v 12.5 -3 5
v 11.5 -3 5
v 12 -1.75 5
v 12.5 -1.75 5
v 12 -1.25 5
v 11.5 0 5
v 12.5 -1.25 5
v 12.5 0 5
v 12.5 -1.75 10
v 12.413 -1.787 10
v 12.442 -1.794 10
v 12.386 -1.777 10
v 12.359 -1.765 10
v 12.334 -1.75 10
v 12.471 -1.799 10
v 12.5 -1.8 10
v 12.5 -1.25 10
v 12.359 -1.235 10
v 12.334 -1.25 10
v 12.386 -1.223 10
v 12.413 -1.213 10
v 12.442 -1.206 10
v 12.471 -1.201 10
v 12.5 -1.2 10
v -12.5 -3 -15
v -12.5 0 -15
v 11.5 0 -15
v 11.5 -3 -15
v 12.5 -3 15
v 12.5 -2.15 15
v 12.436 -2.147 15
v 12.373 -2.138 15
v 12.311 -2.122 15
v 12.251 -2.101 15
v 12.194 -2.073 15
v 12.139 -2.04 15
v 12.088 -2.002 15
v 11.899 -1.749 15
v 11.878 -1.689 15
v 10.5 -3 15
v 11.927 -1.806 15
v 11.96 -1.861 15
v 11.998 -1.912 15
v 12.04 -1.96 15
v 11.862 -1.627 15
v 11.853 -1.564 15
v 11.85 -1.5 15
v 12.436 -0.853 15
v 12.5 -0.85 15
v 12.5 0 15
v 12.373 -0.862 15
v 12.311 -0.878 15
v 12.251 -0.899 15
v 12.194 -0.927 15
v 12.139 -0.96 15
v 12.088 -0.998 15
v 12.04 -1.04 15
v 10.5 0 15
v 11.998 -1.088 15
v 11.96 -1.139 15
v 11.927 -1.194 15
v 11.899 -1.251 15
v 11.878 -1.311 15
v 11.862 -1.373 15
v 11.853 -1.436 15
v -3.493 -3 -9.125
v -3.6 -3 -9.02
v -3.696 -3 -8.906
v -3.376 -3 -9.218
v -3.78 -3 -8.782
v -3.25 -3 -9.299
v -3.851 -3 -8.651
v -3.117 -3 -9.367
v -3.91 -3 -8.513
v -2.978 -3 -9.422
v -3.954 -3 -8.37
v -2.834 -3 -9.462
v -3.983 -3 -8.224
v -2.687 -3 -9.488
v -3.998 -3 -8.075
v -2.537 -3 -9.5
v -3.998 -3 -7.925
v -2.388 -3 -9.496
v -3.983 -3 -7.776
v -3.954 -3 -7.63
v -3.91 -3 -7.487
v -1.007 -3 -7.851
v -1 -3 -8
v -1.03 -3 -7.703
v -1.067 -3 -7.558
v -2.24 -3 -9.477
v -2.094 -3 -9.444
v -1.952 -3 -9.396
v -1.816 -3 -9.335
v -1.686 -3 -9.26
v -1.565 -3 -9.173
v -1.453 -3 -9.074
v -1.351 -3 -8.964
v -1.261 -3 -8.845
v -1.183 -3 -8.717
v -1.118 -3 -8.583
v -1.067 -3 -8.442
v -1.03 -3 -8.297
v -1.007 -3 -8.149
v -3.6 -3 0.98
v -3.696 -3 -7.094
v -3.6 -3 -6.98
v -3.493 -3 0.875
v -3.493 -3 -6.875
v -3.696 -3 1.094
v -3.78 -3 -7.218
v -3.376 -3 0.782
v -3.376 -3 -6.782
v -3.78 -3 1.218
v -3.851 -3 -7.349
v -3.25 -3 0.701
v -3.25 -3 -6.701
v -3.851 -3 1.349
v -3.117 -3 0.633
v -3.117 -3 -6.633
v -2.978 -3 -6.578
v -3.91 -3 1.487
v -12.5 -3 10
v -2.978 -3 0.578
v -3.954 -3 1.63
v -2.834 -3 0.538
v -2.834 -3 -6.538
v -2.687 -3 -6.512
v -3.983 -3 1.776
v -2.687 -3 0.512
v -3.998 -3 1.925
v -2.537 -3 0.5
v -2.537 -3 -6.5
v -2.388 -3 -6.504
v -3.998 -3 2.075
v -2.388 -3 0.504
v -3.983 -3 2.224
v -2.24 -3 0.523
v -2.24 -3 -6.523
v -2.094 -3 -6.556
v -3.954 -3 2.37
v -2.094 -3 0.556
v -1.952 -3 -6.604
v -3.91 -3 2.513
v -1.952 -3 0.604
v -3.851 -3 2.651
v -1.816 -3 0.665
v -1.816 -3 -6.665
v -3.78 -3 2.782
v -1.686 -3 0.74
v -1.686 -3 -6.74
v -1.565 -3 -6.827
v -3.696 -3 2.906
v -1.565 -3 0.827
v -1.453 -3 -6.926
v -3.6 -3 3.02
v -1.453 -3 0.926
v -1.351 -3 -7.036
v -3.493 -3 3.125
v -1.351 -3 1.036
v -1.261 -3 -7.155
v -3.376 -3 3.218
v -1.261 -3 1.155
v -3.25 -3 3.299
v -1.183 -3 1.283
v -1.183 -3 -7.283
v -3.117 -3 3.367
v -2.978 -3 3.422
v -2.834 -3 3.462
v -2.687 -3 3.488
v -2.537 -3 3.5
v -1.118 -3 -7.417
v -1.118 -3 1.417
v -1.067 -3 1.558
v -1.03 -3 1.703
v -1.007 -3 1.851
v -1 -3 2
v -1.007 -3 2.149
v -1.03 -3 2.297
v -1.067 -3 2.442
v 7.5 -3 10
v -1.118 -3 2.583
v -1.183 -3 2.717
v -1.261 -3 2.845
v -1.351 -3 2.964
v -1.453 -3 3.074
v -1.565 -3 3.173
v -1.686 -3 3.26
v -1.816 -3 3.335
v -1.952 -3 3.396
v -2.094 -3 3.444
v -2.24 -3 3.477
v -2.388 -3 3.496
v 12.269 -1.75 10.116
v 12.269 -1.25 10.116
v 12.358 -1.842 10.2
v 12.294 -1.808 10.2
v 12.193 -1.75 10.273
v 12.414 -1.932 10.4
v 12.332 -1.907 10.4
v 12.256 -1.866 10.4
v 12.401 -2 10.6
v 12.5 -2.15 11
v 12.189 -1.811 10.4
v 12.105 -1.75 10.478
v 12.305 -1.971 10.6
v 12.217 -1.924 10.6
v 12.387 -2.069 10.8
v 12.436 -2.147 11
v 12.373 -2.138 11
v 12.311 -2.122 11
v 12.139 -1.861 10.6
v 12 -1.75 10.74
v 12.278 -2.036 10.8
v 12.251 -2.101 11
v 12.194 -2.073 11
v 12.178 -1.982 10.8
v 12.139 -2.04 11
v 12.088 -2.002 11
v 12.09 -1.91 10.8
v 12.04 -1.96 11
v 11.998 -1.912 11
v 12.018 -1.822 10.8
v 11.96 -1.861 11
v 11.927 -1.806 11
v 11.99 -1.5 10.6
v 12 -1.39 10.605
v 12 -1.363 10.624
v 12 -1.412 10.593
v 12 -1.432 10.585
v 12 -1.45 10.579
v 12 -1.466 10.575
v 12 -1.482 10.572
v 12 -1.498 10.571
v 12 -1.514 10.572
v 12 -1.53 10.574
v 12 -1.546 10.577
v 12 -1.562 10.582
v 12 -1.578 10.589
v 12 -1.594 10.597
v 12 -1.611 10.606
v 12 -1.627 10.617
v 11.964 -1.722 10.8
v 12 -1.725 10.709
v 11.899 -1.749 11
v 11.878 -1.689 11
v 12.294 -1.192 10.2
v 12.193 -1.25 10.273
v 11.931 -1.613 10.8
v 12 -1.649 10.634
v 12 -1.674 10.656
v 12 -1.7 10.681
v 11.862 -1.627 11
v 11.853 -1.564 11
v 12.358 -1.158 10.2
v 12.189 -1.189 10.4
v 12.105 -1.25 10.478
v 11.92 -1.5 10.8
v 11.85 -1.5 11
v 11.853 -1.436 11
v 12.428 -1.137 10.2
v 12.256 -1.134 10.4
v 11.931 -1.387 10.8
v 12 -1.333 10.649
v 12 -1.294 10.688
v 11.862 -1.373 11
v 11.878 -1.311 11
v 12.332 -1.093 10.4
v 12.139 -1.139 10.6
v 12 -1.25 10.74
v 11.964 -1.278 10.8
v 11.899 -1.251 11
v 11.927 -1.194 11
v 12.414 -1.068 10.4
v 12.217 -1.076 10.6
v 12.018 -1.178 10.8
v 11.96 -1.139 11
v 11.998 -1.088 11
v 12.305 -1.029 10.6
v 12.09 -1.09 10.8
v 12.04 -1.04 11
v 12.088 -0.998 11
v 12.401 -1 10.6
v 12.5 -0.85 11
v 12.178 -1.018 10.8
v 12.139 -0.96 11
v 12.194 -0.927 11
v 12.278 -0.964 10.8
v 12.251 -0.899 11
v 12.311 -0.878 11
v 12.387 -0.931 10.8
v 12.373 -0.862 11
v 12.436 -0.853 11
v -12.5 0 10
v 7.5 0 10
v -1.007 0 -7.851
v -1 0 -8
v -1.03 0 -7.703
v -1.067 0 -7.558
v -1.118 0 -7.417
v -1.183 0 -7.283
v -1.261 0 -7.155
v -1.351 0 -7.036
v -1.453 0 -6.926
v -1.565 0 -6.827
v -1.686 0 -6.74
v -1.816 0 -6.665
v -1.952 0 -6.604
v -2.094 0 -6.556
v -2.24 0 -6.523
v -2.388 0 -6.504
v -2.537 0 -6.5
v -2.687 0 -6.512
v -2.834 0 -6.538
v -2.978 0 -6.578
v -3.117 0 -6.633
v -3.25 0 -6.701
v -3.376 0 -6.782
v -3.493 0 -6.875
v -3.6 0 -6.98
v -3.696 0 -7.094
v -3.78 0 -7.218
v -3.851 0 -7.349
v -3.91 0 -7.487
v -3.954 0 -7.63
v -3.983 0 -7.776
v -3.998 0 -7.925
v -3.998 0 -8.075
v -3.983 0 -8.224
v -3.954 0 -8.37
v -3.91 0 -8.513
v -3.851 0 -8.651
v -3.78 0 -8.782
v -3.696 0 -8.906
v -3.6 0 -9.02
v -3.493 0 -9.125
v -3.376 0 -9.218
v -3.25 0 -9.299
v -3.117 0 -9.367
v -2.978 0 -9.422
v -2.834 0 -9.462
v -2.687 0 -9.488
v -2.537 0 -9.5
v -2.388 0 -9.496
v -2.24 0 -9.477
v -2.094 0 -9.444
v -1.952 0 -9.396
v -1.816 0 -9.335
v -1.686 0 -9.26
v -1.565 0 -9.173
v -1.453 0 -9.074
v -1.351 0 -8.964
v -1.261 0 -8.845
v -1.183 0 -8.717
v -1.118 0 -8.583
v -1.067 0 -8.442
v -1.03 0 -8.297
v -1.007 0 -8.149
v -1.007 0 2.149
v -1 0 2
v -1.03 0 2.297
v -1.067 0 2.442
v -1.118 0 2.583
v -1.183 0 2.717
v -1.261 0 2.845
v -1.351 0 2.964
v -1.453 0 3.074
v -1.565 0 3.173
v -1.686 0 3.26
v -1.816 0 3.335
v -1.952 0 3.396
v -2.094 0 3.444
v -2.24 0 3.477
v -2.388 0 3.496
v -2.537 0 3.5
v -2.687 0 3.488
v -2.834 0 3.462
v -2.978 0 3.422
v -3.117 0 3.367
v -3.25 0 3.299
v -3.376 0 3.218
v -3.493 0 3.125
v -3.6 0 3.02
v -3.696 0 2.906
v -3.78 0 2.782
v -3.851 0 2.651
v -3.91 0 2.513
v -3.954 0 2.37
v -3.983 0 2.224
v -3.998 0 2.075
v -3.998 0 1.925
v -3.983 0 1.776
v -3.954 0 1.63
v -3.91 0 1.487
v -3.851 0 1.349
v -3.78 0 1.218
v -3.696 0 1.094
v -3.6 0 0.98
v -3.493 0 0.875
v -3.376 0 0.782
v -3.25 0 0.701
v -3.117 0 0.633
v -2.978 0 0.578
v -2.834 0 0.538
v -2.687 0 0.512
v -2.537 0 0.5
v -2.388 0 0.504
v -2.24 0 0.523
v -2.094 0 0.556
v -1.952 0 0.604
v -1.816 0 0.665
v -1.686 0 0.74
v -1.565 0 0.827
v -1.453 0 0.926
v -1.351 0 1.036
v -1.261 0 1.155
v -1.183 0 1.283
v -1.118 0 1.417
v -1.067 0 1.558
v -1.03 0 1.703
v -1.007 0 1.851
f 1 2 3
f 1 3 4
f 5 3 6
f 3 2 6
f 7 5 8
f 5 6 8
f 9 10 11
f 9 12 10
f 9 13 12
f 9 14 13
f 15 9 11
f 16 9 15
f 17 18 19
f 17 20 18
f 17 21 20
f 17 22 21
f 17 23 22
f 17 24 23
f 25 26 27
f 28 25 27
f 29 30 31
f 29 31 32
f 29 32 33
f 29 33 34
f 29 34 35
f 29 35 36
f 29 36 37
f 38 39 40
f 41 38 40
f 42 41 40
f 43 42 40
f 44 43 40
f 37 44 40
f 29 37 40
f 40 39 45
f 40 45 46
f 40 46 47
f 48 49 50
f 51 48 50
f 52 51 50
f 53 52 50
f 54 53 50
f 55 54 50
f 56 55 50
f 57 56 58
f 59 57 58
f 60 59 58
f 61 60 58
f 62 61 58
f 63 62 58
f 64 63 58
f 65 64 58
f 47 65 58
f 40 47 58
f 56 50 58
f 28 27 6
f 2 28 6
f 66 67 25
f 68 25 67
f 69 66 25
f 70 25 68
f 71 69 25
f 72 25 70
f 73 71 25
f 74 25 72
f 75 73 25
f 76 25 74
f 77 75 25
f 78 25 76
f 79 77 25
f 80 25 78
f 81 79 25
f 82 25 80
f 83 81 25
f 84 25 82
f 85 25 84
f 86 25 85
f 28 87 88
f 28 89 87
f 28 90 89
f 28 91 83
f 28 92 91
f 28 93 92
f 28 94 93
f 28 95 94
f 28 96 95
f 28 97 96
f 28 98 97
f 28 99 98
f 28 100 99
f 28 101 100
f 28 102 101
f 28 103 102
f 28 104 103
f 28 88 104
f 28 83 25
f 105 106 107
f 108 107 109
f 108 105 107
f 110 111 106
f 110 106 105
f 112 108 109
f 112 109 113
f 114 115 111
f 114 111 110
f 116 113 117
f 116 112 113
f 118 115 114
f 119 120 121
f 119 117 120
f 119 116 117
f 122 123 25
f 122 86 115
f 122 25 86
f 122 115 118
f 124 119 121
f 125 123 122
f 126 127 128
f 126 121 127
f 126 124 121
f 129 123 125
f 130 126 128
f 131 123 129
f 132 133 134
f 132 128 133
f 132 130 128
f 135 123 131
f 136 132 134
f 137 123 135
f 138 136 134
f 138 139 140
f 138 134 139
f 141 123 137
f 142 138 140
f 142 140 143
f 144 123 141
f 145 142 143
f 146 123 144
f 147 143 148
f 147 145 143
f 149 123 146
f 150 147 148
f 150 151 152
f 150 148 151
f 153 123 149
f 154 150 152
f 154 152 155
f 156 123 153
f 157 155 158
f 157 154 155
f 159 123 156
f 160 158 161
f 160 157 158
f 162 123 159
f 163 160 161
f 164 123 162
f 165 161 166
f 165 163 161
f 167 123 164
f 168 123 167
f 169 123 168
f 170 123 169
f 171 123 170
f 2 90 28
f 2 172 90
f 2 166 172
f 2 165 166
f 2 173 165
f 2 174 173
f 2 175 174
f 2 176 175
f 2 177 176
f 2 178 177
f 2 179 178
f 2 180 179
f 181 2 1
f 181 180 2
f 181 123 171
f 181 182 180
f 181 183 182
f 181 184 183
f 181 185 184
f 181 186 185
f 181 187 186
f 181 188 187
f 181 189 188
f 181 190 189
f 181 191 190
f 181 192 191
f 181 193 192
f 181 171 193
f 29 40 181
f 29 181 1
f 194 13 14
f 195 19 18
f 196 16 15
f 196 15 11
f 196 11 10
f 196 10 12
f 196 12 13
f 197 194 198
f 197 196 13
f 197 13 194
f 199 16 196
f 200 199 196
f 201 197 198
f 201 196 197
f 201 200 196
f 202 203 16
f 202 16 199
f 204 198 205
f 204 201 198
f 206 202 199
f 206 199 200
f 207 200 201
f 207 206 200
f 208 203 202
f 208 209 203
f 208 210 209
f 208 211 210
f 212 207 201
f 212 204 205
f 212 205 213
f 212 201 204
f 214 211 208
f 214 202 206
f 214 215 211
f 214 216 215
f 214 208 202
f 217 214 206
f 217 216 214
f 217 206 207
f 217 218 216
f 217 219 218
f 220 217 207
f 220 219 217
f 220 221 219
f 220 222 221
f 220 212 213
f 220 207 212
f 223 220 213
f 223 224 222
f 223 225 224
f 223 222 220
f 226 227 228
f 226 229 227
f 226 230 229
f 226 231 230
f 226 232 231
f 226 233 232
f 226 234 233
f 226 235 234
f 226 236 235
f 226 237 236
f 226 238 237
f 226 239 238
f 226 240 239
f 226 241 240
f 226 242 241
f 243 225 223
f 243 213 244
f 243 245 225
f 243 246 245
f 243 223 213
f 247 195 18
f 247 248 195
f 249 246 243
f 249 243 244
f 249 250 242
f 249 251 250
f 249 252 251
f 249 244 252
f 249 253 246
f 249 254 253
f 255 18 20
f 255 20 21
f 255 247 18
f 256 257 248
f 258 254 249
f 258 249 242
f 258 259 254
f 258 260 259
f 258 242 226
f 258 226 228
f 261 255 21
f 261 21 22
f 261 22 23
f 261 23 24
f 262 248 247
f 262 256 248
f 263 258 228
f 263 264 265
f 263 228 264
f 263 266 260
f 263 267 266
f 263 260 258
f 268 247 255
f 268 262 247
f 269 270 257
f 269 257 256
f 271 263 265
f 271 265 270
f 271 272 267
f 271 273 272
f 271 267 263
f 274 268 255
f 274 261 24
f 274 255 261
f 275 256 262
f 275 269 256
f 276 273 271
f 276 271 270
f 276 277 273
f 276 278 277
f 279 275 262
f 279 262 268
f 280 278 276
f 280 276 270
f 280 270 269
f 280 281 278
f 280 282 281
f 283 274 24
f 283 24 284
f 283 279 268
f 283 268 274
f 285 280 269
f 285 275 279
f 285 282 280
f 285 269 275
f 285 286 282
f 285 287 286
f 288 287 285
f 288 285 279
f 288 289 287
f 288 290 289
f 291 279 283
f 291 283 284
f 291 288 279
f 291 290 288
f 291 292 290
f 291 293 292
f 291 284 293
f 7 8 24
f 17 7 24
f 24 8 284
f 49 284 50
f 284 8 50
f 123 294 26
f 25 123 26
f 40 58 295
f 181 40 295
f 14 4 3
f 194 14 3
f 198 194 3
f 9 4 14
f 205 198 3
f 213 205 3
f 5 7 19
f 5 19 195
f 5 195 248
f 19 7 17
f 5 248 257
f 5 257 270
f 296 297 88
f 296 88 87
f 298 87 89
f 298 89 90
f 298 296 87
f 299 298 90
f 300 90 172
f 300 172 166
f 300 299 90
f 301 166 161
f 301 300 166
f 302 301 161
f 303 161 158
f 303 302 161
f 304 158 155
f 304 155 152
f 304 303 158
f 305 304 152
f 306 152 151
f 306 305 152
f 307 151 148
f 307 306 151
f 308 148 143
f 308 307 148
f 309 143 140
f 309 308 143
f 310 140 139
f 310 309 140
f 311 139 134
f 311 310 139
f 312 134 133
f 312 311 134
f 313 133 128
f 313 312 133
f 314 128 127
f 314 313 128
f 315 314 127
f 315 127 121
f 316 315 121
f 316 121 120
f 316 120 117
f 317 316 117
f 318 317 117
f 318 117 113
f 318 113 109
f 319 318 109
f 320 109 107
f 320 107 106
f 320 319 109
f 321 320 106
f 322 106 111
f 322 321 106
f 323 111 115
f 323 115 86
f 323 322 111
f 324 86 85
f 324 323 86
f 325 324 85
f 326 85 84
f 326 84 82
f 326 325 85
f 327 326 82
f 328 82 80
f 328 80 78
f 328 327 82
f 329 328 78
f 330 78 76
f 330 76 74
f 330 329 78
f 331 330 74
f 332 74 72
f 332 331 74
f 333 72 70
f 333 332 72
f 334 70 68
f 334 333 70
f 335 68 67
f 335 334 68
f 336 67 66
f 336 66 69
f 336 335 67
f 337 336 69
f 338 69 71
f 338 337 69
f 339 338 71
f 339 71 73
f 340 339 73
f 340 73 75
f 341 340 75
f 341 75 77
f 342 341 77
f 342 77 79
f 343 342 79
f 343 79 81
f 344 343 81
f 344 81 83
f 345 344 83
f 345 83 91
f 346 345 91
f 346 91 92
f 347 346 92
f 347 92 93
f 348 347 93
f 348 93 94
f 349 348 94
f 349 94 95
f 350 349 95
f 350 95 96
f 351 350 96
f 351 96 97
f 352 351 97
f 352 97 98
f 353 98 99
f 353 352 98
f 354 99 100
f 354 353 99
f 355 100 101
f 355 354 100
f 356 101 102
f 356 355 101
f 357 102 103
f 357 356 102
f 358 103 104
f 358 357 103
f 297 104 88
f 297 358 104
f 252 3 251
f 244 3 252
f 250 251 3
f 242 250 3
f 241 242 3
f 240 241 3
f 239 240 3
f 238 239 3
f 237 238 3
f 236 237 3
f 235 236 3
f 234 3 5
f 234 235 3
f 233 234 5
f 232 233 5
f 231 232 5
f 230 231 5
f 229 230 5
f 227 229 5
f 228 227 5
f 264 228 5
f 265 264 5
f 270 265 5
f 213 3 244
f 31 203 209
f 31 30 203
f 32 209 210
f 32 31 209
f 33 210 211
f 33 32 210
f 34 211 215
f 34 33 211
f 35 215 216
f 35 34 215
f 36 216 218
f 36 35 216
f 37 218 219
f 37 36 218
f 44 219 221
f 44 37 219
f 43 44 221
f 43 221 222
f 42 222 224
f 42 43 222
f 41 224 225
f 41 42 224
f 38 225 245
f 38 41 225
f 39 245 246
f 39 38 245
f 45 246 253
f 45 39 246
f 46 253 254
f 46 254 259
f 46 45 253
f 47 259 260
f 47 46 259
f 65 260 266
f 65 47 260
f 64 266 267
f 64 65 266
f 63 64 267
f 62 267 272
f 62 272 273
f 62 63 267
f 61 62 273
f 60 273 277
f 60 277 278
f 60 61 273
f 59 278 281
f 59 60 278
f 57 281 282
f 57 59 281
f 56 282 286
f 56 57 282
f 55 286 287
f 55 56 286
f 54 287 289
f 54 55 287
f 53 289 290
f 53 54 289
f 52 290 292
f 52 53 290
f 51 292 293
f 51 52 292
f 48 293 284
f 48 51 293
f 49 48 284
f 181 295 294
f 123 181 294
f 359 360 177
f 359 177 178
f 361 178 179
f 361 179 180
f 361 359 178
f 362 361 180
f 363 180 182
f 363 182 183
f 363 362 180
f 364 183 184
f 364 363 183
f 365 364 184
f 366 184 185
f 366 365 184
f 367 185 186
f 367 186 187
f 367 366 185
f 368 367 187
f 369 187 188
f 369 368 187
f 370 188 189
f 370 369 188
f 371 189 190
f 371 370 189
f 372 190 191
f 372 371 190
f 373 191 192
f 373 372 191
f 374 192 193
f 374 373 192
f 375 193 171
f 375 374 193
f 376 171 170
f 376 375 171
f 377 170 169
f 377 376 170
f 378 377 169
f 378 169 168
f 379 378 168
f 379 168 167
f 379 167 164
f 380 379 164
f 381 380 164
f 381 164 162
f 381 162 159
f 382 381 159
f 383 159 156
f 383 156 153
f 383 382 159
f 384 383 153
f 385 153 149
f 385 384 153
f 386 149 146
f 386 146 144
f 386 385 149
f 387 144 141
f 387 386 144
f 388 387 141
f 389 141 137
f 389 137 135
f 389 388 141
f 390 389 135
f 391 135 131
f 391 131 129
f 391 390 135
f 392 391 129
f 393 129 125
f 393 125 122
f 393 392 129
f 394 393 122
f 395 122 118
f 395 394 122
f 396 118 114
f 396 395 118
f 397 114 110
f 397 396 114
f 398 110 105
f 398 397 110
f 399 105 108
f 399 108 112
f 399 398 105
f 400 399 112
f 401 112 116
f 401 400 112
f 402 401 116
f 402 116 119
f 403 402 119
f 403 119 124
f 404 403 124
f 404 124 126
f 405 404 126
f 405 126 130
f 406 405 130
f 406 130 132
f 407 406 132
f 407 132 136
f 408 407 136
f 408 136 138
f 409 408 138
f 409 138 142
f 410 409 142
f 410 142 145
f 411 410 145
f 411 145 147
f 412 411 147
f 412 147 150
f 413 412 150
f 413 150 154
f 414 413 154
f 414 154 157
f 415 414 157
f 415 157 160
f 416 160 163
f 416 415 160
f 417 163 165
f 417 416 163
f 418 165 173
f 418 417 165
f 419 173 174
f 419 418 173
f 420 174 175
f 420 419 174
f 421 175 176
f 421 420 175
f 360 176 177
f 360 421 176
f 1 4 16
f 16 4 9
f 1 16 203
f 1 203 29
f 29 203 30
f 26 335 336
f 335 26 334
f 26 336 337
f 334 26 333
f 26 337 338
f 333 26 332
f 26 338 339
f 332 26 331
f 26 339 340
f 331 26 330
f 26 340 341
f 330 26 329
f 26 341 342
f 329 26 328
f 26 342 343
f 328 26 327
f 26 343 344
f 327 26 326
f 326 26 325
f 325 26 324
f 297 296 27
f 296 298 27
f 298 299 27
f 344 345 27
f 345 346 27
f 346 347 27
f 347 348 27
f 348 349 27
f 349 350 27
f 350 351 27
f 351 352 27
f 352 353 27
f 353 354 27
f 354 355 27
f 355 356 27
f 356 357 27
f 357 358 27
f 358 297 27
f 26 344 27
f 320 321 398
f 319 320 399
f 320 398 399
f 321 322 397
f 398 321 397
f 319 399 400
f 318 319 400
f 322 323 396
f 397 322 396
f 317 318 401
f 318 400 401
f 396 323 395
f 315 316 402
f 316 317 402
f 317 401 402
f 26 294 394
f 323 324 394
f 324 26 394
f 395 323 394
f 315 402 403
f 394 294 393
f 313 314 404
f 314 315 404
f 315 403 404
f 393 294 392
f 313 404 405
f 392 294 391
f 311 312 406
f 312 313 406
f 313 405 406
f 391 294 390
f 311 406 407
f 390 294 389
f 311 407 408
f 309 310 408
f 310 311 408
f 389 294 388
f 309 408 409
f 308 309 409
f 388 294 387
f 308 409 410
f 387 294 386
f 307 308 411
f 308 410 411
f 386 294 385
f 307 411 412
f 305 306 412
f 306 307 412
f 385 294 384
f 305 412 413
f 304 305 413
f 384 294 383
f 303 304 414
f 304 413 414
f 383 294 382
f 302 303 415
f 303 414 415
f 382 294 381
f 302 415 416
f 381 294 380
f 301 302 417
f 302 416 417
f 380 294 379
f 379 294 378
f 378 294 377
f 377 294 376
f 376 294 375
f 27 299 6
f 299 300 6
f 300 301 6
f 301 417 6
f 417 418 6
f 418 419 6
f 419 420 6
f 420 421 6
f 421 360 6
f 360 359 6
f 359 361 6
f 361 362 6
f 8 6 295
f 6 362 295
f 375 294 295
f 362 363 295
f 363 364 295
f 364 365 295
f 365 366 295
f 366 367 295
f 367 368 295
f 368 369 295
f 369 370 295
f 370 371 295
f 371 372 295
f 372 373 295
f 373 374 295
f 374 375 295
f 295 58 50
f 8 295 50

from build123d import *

# Parameters (mm, degrees)
F0_R     = 1.5
F1_DEPTH = 3
F4_W     = 0.5
F4_H     = 7.027182
F5_DEPTH = 0.5


with BuildPart() as f1:
    # F0 (on Front) → F1 (new body)
    with BuildSketch(Plane.XZ):
        Polygon((12.5, 5), (12.5, 15), (10.5, 15), (7.5, 10), (-12.5, 10), (-12.5, -15), (11.5, -15), (11.5, 5), align=None)
        with Locations((-2.5, -8)):
            Circle(F0_R, mode=Mode.SUBTRACT)
        with Locations((-2.5, 2)):
            Circle(F0_R, mode=Mode.SUBTRACT)
    extrude(amount=F1_DEPTH)

    # F2 (on face) → F3 (revolve, cut)
    with BuildSketch(Plane.YZ.offset(12.5)):
        Polygon((-0.85, 15.881686), (-1.5, 15.881686), (-1.5, 10), (-1.2, 10), (-0.85, 11), align=None)
    revolve(axis=Axis((12.5, -1.5, 3.419226), (0, 0, -1)), mode=Mode.SUBTRACT)

    # F4 (on face) → F5 (cut)
    with BuildSketch(Plane.YZ.offset(12.5)):
        with Locations((-1.5, 7.433284)):
            Rectangle(F4_W, F4_H)
    extrude(amount=-F5_DEPTH, mode=Mode.SUBTRACT)


solid = f1.part
